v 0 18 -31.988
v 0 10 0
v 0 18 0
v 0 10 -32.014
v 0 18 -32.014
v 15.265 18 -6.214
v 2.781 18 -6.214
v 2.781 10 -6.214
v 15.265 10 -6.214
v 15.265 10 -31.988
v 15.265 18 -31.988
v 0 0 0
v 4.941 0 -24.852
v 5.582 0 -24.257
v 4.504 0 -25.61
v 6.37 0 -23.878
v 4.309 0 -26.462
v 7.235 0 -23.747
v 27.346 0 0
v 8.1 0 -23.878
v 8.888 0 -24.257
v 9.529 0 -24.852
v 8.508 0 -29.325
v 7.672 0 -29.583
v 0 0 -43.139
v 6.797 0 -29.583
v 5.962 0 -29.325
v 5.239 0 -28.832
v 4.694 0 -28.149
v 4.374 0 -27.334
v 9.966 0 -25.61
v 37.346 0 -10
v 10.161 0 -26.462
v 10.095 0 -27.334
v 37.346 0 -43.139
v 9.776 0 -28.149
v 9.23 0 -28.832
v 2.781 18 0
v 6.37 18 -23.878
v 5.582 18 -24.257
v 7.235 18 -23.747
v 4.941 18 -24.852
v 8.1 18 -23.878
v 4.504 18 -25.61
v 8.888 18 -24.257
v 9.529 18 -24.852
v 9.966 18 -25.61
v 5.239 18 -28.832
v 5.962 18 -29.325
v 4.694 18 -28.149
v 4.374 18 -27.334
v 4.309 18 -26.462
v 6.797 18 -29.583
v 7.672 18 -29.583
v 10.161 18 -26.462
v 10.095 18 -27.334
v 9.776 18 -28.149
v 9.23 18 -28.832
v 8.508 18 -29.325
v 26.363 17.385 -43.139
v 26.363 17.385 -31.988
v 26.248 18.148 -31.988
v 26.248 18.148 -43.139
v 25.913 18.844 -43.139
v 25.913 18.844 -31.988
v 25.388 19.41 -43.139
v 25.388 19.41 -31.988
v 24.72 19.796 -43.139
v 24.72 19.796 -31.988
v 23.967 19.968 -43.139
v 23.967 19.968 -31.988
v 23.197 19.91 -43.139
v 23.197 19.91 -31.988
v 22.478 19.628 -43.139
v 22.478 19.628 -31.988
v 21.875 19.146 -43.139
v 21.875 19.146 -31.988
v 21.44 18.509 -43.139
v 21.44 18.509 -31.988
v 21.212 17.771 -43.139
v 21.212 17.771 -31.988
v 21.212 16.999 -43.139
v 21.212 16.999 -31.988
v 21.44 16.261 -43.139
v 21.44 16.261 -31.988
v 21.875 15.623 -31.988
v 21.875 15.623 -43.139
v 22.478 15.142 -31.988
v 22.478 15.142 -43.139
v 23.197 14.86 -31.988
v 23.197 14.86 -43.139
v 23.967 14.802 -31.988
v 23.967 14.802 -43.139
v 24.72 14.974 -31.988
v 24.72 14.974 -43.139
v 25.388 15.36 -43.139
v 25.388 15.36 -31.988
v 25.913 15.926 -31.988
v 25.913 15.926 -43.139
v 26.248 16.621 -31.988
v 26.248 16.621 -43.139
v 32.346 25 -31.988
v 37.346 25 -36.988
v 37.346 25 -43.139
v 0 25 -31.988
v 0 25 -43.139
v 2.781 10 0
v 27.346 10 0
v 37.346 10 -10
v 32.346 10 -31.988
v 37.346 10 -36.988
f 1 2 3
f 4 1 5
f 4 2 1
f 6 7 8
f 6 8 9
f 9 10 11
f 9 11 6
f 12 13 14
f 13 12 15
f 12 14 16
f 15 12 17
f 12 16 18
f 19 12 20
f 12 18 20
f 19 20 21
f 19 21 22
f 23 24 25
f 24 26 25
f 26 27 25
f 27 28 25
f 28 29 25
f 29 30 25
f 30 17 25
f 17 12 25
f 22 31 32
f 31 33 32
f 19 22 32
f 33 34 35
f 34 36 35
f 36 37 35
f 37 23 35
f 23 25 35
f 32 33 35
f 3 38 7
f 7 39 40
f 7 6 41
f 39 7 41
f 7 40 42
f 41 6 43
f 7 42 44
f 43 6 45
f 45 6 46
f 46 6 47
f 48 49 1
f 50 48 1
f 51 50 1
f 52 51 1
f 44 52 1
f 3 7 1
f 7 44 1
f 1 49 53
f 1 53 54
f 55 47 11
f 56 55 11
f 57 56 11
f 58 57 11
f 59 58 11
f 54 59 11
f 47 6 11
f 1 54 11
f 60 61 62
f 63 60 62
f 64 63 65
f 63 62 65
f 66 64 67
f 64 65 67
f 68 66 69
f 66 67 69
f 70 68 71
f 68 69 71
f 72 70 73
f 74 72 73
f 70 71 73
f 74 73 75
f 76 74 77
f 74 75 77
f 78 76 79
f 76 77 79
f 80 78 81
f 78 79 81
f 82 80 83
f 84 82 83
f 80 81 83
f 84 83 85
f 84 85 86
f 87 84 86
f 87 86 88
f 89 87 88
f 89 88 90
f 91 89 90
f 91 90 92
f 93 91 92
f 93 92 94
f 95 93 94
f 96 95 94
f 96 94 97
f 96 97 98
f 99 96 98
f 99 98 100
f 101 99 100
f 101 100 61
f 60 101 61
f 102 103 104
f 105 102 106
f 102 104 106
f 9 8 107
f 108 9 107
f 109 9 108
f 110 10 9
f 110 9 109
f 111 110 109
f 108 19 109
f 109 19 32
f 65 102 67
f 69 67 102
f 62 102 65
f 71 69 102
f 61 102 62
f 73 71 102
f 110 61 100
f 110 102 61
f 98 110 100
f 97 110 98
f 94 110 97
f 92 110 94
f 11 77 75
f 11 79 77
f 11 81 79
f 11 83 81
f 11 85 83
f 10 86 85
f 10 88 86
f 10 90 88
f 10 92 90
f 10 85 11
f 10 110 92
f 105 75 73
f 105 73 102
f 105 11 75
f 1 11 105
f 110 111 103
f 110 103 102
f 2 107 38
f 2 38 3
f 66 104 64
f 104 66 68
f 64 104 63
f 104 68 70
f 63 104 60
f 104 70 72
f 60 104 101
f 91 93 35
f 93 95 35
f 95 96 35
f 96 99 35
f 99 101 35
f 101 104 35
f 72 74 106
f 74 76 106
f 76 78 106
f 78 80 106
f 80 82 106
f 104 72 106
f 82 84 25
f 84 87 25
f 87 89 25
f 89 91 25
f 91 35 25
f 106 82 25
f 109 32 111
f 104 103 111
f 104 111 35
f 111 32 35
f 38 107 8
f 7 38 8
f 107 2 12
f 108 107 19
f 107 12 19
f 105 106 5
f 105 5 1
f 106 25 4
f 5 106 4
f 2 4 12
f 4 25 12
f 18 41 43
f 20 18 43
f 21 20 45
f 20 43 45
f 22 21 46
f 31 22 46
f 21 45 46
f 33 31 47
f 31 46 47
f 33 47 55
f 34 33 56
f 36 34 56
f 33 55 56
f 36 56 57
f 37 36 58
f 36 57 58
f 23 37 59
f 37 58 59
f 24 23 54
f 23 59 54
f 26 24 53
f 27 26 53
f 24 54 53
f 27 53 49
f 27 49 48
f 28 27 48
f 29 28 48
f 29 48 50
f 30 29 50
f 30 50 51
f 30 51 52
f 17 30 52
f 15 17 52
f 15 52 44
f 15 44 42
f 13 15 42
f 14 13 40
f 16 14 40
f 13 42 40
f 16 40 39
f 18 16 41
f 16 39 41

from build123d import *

# Parameters (mm, degrees)
BOSS_EXTRUDE1_DEPTH = 10
BOSS_EXTRUDE2_DEPTH = 8
BOSS_EXTRUDE4_DEPTH = 25
SKETCH3_W           = 12.484022429
SKETCH3_H           = 6.213790253
CUT_EXTRUDE1_DEPTH  = 8
SKETCH7_R           = 2.934045285
CUT_EXTRUDE4_DEPTH  = 18
SKETCH8_R           = 2.590039353
CUT_EXTRUDE5_DEPTH  = 18


with BuildPart() as part:
    # Sketch1 → Boss-Extrude1 (new body)
    with BuildSketch(Plane(origin=(0, 0, 0), x_dir=(1, 0, 0), z_dir=(0, 1, 0))):
        Polygon((27.346217797, 0), (37.346217797, 10), (37.346217797, 43.13883642), (0, 43.13883642), (0, 0), align=None)
    extrude(amount=BOSS_EXTRUDE1_DEPTH)

    # 3DSketch1 → Boss-Extrude2 (add)
    with BuildSketch(Plane(origin=(0, 10, -32.014495021), x_dir=(0.4303839412255019, 0, 0.9026459234579215), z_dir=(0, 1, 0))):
        Polygon((0, 0), (6.569636602, 13.778524544), (35.467390024, 0), (28.897753422, -13.778524544), align=None)
    extrude(amount=BOSS_EXTRUDE2_DEPTH)

    # Sketch2 → Boss-Extrude4 (add)
    with BuildSketch(Plane(origin=(0, 0, 0), x_dir=(1, 0, 0), z_dir=(0, 1, 0))):
        Polygon((0, 43.13883642), (37.346217797, 43.13883642), (37.346217797, 36.988423425), (32.346217797, 31.988423425), (0, 31.988423425), align=None)
    extrude(amount=BOSS_EXTRUDE4_DEPTH)

    # Sketch3 → Cut-Extrude1 (cut)
    with BuildSketch(Plane(origin=(0, 18, 0), x_dir=(1, 0, 0), z_dir=(0, 1, 0))):
        with Locations((9.02258389, 3.106895126)):
            Rectangle(SKETCH3_W, SKETCH3_H)
    extrude(amount=-CUT_EXTRUDE1_DEPTH, mode=Mode.SUBTRACT)

    # Sketch7 → Cut-Extrude4 (cut)
    with BuildSketch(Plane(origin=(0, 18, 0), x_dir=(1, 0, 0), z_dir=(0, 1, 0))):
        with Locations(Location((7.23477268, 26.681503573, 0), (0, 0, 270))):
            Circle(SKETCH7_R)
    extrude(amount=-CUT_EXTRUDE4_DEPTH, mode=Mode.SUBTRACT)

    # Sketch8 → Cut-Extrude5 (cut)
    with BuildSketch(Plane.XY.offset(-31.988423425)):
        with Locations((23.773325806, 17.384751646)):
            Circle(SKETCH8_R)
    extrude(amount=-CUT_EXTRUDE5_DEPTH, mode=Mode.SUBTRACT)


solid = part.part
